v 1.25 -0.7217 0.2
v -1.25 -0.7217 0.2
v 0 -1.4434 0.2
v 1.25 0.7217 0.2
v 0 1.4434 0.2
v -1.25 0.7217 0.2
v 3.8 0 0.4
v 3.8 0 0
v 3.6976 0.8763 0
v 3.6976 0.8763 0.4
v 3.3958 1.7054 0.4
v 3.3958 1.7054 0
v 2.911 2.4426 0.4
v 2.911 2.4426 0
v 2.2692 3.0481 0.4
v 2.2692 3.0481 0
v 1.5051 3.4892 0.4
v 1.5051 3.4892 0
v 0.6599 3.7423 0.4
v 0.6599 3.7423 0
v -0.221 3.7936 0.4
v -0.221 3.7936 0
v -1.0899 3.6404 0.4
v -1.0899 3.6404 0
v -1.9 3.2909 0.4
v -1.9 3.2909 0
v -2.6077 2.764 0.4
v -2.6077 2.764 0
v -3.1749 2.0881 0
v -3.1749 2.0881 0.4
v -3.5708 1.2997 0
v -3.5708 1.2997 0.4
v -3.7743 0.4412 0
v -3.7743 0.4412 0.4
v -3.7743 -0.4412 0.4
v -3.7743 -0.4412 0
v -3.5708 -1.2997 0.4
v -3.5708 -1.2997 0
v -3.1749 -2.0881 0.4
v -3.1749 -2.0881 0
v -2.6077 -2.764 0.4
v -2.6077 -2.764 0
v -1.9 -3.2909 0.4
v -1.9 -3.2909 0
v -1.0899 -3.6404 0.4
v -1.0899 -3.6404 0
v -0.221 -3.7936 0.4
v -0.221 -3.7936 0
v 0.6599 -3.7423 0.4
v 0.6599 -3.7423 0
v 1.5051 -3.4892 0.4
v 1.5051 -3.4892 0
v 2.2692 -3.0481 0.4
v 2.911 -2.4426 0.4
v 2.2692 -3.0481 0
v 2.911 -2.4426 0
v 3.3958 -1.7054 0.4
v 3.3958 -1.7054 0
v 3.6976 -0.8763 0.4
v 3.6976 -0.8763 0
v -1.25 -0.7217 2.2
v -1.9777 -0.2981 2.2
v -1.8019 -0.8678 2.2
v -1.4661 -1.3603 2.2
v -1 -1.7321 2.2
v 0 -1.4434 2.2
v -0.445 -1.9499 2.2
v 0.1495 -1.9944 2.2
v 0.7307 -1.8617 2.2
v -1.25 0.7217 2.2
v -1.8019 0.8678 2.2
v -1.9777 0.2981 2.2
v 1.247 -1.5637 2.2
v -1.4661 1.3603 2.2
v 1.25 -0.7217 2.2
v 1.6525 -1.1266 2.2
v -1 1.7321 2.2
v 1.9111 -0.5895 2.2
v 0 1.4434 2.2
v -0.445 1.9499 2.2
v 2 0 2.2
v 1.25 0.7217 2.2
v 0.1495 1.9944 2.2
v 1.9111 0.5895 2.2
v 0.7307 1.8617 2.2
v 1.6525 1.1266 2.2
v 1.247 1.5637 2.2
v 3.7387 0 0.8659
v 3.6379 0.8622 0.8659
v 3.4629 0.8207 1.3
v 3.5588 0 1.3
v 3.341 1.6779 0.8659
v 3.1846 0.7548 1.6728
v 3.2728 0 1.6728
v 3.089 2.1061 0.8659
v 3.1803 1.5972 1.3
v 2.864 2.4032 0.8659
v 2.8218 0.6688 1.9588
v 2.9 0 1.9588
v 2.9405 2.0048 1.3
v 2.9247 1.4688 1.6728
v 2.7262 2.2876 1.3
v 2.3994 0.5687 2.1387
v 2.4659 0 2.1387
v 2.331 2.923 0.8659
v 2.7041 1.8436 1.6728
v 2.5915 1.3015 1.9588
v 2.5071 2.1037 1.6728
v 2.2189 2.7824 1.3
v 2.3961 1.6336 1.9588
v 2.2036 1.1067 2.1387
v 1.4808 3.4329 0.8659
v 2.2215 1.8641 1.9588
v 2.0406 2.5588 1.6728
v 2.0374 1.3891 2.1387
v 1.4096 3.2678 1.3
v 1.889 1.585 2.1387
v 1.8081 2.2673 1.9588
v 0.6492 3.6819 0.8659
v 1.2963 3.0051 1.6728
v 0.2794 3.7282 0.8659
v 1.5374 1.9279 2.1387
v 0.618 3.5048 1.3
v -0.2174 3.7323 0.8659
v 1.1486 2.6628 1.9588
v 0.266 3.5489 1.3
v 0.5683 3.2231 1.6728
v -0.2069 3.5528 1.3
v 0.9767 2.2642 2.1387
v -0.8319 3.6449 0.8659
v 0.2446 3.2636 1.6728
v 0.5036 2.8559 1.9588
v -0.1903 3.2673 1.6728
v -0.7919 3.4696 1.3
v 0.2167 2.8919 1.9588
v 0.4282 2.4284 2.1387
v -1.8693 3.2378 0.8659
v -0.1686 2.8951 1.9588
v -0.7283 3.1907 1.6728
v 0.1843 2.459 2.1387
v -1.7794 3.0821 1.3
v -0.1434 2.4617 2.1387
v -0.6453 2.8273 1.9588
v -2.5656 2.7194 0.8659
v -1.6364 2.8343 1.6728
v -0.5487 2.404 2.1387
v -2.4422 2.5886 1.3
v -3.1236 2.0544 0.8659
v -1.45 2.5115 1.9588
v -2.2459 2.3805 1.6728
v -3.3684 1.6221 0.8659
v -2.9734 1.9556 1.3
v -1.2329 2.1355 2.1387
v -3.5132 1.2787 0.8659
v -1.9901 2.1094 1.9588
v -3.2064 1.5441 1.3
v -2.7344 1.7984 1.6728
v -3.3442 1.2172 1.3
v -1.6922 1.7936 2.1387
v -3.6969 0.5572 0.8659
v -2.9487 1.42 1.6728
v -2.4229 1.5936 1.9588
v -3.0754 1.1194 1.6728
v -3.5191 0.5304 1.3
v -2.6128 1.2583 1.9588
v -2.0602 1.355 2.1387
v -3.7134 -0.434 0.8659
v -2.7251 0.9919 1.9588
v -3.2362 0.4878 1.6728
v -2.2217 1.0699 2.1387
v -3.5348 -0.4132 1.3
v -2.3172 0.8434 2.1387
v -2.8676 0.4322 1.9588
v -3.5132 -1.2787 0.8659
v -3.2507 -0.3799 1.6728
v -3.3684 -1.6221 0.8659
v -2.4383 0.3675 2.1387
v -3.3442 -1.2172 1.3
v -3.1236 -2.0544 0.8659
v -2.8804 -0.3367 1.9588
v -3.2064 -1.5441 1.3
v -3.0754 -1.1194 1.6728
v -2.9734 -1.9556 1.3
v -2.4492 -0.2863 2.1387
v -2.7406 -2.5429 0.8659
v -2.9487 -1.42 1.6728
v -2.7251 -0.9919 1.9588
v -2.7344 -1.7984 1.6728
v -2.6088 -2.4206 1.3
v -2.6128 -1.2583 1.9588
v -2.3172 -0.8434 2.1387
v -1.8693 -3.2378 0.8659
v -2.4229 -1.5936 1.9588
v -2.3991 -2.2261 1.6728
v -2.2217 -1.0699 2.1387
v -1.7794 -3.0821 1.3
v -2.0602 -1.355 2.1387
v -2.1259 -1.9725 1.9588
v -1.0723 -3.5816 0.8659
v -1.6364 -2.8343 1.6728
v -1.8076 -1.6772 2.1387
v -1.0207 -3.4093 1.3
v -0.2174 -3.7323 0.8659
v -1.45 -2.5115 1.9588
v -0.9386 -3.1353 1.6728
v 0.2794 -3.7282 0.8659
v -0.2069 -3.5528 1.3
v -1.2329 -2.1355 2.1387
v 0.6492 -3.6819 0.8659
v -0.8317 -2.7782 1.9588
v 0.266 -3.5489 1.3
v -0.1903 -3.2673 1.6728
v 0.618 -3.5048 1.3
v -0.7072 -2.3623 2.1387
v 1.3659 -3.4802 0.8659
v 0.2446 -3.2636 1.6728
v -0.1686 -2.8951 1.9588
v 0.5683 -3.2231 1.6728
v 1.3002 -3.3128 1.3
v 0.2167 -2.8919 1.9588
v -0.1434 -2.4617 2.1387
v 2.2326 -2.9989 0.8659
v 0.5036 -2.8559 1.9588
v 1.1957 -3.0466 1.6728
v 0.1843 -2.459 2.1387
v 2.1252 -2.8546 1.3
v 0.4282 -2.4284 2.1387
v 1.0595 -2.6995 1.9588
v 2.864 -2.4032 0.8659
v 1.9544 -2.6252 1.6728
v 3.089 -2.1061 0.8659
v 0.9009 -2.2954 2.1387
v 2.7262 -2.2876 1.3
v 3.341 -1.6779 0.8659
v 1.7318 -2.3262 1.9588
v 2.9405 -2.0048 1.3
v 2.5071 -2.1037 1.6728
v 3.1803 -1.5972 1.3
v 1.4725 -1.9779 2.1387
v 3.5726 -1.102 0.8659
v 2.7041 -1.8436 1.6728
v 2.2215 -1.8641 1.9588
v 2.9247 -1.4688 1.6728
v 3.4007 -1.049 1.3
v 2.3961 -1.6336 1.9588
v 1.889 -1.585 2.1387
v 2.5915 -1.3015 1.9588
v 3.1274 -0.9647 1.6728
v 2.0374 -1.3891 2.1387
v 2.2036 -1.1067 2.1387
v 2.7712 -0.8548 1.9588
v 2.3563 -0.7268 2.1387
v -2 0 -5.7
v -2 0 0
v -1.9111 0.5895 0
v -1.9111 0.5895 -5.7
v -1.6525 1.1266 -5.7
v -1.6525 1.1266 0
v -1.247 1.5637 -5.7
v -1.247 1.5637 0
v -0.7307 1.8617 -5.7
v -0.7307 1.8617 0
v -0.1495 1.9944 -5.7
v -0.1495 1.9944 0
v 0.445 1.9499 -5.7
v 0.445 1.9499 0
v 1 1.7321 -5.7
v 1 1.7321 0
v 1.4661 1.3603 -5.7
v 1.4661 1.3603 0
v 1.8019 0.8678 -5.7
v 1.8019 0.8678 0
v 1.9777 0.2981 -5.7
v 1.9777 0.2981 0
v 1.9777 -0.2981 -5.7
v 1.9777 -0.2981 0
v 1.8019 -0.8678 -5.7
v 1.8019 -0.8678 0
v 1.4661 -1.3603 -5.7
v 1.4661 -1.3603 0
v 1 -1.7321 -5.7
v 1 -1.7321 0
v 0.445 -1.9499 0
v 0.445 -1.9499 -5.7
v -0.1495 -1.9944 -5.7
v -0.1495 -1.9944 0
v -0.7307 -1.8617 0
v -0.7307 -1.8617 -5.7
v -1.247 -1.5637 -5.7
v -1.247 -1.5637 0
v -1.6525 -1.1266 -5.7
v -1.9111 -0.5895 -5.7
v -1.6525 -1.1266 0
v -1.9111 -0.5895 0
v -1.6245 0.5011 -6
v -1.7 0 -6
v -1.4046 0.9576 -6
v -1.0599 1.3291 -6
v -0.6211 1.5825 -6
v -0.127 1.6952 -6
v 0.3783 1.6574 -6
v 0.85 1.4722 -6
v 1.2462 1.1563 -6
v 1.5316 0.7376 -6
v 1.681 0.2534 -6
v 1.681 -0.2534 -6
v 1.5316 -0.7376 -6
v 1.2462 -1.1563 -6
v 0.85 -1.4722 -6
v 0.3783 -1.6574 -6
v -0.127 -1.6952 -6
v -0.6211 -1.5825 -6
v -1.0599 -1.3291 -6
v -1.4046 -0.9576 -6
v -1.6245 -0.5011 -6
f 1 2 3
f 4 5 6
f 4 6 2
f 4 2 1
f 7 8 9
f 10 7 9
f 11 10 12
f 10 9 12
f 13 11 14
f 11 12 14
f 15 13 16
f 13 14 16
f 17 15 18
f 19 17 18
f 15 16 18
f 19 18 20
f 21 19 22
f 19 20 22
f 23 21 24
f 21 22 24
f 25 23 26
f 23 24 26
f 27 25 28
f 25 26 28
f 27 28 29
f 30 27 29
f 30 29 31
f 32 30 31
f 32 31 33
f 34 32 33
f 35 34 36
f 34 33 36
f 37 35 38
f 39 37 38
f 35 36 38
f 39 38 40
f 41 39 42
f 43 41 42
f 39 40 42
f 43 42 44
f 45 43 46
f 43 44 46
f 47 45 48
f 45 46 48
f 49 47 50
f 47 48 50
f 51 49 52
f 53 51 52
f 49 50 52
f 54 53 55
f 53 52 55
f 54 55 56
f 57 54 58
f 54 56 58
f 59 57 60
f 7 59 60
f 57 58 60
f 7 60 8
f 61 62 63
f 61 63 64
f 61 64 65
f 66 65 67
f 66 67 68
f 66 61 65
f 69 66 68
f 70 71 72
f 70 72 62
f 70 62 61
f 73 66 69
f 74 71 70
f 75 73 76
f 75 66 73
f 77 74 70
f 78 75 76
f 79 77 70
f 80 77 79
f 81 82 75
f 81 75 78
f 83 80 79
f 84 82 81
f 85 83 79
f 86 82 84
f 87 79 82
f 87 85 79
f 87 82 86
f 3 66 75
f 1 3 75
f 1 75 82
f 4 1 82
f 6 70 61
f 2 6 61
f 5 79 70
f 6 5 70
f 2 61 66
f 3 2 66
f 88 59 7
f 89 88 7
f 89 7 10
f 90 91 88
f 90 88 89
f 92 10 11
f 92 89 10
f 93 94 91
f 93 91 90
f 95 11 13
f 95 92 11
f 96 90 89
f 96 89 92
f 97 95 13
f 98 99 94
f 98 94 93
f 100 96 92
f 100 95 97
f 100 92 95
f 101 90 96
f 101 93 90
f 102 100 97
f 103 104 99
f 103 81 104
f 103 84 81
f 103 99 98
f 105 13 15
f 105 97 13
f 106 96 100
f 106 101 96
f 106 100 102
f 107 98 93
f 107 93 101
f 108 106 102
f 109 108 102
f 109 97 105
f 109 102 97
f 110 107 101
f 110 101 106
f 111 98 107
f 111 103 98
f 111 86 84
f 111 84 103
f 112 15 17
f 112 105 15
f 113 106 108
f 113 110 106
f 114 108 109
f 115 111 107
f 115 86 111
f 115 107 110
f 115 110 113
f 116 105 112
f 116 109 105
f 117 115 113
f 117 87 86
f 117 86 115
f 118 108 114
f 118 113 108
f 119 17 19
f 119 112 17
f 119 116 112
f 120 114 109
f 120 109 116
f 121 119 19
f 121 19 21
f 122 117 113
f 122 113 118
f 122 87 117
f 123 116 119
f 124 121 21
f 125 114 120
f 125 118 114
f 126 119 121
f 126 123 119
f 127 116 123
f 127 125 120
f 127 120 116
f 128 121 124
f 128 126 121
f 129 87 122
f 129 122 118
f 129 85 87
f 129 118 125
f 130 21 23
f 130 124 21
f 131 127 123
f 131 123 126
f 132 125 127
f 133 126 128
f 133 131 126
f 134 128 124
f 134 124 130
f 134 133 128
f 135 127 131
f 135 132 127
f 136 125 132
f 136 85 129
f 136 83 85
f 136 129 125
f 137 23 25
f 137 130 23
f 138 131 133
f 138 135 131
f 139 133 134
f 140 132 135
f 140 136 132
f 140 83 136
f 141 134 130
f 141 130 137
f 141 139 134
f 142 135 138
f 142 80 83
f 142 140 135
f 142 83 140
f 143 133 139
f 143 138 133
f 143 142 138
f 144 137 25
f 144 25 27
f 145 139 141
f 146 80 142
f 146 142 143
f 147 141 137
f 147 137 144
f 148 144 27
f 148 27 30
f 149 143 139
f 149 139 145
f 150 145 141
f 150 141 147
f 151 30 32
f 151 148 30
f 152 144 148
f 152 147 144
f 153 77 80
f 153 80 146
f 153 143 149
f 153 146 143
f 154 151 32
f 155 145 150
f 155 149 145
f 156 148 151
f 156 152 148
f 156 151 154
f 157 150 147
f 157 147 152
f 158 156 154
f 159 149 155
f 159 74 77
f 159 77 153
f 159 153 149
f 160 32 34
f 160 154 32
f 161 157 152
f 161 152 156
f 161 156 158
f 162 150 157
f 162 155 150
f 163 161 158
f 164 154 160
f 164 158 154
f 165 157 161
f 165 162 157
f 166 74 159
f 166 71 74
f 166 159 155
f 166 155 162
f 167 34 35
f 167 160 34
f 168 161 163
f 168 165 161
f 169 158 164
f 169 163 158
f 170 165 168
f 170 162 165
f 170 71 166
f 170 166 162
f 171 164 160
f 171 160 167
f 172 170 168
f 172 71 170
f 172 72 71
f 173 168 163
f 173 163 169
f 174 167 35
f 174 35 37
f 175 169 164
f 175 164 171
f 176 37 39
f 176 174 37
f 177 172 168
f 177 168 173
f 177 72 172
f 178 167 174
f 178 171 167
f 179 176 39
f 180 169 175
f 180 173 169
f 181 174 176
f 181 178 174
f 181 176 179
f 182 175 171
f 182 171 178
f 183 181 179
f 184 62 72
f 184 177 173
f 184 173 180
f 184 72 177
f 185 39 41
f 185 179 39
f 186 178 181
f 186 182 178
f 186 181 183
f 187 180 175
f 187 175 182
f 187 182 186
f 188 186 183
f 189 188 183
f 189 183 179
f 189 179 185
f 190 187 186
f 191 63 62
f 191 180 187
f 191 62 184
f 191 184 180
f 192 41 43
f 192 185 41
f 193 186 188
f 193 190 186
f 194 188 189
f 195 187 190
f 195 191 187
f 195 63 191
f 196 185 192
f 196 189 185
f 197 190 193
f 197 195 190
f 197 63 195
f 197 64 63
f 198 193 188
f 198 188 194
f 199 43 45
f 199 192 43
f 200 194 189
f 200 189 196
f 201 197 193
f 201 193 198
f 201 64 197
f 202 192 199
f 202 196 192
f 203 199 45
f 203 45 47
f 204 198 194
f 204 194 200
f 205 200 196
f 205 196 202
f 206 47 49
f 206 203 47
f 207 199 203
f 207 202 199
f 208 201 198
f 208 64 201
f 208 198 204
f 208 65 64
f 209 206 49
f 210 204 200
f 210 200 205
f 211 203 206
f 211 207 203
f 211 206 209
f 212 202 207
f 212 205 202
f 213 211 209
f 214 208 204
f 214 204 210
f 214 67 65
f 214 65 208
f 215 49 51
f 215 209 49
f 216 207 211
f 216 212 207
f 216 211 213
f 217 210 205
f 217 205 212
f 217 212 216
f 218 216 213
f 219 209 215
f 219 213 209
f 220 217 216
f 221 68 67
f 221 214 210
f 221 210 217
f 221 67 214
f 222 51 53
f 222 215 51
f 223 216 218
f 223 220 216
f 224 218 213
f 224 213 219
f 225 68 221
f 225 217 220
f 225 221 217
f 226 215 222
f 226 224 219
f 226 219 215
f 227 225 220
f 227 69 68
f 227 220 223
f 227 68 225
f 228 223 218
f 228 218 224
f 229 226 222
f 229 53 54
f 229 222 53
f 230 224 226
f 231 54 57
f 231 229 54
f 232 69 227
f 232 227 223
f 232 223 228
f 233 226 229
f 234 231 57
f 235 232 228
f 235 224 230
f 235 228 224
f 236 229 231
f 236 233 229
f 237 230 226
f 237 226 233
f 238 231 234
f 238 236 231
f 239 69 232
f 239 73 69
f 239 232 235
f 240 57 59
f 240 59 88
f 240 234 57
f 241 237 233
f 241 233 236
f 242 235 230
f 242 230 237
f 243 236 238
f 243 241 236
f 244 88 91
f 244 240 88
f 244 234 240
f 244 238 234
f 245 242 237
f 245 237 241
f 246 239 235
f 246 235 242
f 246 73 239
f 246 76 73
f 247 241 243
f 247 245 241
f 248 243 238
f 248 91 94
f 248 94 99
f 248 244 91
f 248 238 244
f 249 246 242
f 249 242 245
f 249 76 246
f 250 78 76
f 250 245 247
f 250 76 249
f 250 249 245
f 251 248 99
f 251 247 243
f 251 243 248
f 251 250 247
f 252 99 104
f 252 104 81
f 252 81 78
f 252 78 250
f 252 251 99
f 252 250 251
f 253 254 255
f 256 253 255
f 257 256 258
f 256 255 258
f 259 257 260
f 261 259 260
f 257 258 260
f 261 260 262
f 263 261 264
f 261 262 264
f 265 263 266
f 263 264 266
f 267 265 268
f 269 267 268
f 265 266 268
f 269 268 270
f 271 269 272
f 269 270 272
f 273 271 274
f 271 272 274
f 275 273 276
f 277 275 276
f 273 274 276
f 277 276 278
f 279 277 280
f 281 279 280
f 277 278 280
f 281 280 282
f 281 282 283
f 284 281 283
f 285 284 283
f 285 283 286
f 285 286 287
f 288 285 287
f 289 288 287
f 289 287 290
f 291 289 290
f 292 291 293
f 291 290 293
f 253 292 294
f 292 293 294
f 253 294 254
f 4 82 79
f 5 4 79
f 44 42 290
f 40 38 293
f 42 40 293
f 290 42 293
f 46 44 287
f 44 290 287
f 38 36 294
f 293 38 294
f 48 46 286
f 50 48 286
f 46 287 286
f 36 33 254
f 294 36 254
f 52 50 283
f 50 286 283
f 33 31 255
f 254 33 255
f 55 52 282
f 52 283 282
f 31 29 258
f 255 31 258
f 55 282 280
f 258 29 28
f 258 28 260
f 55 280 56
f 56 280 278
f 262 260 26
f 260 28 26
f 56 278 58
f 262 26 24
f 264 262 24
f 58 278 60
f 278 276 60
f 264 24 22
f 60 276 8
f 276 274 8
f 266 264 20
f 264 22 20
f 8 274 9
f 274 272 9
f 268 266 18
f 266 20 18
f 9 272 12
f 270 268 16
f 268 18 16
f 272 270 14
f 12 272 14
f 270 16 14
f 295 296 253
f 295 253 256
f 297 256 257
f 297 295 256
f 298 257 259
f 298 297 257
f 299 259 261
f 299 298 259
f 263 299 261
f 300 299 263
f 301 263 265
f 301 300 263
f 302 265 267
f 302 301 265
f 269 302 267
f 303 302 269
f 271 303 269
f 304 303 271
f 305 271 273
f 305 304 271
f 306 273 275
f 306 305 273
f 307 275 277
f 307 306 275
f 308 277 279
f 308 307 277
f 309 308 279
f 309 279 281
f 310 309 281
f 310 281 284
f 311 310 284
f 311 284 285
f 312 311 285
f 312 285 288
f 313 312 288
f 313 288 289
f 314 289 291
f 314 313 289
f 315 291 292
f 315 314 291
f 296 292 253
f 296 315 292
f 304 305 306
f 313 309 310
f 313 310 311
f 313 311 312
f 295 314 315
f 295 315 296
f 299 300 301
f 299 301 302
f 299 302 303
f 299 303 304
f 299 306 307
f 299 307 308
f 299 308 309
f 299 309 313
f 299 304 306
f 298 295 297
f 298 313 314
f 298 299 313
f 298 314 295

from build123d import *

# Parameters (mm, degrees)
SKETCH1_R           = 3.8
BOSS_EXTRUDE1_DEPTH = 2.2
SKETCH2_R           = 2
BOSS_EXTRUDE2_DEPTH = 6
CHAMFER1_SIZE       = 0.3
CUT_EXTRUDE1_DEPTH  = 2
FILLET1_R           = 1.8


with BuildPart() as part:
    # Sketch1 → Boss-Extrude1 (new body)
    with BuildSketch(Plane.XY):
        Circle(SKETCH1_R)
    extrude(amount=BOSS_EXTRUDE1_DEPTH)

    # Sketch2 → Boss-Extrude2 (add)
    with BuildSketch(Plane(origin=(0, 0, 0), x_dir=(-1, 0, 0), z_dir=(0, 0, -1))):
        Circle(SKETCH2_R)
    extrude(amount=BOSS_EXTRUDE2_DEPTH)

    # Chamfer1
    chamfer1_edges = [part.edges().sort_by_distance(p)[0] for p in [
        (2, 0, -6),
    ]]
    chamfer(chamfer1_edges, length=CHAMFER1_SIZE)

    # Sketch3 → Cut-Extrude1 (cut)
    with BuildSketch(Plane.XY.offset(2.2)):
        Polygon((0, 1.443375673), (-1.25, 0.721687836), (-1.25, -0.721687836), (0, -1.443375673), (1.25, -0.721687836), (1.25, 0.721687836), align=None)
    extrude(amount=-CUT_EXTRUDE1_DEPTH, mode=Mode.SUBTRACT)

    # Fillet1
    fillet1_edges = [part.edges().sort_by_distance(p)[0] for p in [
        (-3.8, 0, 2.2),
    ]]
    fillet(fillet1_edges, radius=FILLET1_R)


solid = part.part
